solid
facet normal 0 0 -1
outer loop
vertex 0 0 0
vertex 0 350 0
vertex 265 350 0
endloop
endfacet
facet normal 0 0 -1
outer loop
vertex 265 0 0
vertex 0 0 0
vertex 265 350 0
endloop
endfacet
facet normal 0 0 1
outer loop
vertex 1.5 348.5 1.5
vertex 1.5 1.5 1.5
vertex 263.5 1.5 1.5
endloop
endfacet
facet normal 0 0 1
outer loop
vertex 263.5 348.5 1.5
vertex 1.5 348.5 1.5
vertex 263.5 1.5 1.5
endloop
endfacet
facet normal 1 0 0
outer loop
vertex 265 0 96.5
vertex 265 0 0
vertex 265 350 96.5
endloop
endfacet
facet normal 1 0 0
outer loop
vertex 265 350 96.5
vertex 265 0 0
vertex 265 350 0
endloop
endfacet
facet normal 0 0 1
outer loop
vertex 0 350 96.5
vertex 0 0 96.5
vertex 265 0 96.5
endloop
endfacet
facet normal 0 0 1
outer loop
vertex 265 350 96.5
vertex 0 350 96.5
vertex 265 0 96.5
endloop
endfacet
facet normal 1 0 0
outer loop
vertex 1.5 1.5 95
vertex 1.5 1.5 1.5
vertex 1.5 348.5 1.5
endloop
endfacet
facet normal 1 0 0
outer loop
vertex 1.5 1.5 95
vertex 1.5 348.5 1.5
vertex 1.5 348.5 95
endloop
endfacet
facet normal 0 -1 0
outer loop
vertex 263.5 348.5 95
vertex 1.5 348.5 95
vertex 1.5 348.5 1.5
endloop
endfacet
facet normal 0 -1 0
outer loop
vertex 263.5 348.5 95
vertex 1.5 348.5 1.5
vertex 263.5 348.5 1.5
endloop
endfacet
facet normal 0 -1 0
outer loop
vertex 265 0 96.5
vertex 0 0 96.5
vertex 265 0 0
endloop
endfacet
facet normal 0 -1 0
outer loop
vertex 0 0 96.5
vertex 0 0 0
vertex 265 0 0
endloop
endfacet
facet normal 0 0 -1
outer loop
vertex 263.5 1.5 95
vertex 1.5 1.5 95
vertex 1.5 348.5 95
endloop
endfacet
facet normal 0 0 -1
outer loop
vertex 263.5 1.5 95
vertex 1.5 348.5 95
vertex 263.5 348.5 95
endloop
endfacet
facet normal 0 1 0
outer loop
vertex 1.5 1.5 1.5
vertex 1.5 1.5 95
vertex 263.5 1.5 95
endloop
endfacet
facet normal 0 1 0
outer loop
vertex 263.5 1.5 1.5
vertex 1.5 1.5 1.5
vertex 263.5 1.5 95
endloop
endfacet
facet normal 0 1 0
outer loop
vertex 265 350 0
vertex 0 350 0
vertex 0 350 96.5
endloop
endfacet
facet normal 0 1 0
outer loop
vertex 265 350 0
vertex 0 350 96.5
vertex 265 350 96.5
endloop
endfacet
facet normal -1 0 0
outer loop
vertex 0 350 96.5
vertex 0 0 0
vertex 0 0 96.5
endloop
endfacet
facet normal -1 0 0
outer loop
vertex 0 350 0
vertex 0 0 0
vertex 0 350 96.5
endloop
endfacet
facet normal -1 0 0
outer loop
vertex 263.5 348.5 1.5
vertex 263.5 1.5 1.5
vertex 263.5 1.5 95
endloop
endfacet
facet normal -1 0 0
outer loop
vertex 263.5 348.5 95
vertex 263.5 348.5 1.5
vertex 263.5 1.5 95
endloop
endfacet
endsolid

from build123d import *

# Parameters (mm, degrees)
F0_W     = 265
F0_H     = 95
F1_DEPTH = 350
F2_T     = -1.5
F3_W     = 265
F3_H     = 350
F4_DEPTH = 1.5


with BuildPart() as f1:
    # F0 (on Front) → F1 (new body)
    with BuildSketch(Plane.XZ):
        with Locations((132.5, 47.5)):
            Rectangle(F0_W, F0_H)
    extrude(amount=-F1_DEPTH)

    # F2
    f2_openings = [f1.faces().sort_by_distance(p)[0] for p in [
        (132.5, 175, 95),
    ]]
    offset(amount=F2_T, openings=f2_openings)

    # F3 (on face) → F4 (join)
    with BuildSketch(Plane.XY.offset(95)):
        with Locations((132.5, 175)):
            Rectangle(F3_W, F3_H)
    extrude(amount=F4_DEPTH)


solid = f1.part
